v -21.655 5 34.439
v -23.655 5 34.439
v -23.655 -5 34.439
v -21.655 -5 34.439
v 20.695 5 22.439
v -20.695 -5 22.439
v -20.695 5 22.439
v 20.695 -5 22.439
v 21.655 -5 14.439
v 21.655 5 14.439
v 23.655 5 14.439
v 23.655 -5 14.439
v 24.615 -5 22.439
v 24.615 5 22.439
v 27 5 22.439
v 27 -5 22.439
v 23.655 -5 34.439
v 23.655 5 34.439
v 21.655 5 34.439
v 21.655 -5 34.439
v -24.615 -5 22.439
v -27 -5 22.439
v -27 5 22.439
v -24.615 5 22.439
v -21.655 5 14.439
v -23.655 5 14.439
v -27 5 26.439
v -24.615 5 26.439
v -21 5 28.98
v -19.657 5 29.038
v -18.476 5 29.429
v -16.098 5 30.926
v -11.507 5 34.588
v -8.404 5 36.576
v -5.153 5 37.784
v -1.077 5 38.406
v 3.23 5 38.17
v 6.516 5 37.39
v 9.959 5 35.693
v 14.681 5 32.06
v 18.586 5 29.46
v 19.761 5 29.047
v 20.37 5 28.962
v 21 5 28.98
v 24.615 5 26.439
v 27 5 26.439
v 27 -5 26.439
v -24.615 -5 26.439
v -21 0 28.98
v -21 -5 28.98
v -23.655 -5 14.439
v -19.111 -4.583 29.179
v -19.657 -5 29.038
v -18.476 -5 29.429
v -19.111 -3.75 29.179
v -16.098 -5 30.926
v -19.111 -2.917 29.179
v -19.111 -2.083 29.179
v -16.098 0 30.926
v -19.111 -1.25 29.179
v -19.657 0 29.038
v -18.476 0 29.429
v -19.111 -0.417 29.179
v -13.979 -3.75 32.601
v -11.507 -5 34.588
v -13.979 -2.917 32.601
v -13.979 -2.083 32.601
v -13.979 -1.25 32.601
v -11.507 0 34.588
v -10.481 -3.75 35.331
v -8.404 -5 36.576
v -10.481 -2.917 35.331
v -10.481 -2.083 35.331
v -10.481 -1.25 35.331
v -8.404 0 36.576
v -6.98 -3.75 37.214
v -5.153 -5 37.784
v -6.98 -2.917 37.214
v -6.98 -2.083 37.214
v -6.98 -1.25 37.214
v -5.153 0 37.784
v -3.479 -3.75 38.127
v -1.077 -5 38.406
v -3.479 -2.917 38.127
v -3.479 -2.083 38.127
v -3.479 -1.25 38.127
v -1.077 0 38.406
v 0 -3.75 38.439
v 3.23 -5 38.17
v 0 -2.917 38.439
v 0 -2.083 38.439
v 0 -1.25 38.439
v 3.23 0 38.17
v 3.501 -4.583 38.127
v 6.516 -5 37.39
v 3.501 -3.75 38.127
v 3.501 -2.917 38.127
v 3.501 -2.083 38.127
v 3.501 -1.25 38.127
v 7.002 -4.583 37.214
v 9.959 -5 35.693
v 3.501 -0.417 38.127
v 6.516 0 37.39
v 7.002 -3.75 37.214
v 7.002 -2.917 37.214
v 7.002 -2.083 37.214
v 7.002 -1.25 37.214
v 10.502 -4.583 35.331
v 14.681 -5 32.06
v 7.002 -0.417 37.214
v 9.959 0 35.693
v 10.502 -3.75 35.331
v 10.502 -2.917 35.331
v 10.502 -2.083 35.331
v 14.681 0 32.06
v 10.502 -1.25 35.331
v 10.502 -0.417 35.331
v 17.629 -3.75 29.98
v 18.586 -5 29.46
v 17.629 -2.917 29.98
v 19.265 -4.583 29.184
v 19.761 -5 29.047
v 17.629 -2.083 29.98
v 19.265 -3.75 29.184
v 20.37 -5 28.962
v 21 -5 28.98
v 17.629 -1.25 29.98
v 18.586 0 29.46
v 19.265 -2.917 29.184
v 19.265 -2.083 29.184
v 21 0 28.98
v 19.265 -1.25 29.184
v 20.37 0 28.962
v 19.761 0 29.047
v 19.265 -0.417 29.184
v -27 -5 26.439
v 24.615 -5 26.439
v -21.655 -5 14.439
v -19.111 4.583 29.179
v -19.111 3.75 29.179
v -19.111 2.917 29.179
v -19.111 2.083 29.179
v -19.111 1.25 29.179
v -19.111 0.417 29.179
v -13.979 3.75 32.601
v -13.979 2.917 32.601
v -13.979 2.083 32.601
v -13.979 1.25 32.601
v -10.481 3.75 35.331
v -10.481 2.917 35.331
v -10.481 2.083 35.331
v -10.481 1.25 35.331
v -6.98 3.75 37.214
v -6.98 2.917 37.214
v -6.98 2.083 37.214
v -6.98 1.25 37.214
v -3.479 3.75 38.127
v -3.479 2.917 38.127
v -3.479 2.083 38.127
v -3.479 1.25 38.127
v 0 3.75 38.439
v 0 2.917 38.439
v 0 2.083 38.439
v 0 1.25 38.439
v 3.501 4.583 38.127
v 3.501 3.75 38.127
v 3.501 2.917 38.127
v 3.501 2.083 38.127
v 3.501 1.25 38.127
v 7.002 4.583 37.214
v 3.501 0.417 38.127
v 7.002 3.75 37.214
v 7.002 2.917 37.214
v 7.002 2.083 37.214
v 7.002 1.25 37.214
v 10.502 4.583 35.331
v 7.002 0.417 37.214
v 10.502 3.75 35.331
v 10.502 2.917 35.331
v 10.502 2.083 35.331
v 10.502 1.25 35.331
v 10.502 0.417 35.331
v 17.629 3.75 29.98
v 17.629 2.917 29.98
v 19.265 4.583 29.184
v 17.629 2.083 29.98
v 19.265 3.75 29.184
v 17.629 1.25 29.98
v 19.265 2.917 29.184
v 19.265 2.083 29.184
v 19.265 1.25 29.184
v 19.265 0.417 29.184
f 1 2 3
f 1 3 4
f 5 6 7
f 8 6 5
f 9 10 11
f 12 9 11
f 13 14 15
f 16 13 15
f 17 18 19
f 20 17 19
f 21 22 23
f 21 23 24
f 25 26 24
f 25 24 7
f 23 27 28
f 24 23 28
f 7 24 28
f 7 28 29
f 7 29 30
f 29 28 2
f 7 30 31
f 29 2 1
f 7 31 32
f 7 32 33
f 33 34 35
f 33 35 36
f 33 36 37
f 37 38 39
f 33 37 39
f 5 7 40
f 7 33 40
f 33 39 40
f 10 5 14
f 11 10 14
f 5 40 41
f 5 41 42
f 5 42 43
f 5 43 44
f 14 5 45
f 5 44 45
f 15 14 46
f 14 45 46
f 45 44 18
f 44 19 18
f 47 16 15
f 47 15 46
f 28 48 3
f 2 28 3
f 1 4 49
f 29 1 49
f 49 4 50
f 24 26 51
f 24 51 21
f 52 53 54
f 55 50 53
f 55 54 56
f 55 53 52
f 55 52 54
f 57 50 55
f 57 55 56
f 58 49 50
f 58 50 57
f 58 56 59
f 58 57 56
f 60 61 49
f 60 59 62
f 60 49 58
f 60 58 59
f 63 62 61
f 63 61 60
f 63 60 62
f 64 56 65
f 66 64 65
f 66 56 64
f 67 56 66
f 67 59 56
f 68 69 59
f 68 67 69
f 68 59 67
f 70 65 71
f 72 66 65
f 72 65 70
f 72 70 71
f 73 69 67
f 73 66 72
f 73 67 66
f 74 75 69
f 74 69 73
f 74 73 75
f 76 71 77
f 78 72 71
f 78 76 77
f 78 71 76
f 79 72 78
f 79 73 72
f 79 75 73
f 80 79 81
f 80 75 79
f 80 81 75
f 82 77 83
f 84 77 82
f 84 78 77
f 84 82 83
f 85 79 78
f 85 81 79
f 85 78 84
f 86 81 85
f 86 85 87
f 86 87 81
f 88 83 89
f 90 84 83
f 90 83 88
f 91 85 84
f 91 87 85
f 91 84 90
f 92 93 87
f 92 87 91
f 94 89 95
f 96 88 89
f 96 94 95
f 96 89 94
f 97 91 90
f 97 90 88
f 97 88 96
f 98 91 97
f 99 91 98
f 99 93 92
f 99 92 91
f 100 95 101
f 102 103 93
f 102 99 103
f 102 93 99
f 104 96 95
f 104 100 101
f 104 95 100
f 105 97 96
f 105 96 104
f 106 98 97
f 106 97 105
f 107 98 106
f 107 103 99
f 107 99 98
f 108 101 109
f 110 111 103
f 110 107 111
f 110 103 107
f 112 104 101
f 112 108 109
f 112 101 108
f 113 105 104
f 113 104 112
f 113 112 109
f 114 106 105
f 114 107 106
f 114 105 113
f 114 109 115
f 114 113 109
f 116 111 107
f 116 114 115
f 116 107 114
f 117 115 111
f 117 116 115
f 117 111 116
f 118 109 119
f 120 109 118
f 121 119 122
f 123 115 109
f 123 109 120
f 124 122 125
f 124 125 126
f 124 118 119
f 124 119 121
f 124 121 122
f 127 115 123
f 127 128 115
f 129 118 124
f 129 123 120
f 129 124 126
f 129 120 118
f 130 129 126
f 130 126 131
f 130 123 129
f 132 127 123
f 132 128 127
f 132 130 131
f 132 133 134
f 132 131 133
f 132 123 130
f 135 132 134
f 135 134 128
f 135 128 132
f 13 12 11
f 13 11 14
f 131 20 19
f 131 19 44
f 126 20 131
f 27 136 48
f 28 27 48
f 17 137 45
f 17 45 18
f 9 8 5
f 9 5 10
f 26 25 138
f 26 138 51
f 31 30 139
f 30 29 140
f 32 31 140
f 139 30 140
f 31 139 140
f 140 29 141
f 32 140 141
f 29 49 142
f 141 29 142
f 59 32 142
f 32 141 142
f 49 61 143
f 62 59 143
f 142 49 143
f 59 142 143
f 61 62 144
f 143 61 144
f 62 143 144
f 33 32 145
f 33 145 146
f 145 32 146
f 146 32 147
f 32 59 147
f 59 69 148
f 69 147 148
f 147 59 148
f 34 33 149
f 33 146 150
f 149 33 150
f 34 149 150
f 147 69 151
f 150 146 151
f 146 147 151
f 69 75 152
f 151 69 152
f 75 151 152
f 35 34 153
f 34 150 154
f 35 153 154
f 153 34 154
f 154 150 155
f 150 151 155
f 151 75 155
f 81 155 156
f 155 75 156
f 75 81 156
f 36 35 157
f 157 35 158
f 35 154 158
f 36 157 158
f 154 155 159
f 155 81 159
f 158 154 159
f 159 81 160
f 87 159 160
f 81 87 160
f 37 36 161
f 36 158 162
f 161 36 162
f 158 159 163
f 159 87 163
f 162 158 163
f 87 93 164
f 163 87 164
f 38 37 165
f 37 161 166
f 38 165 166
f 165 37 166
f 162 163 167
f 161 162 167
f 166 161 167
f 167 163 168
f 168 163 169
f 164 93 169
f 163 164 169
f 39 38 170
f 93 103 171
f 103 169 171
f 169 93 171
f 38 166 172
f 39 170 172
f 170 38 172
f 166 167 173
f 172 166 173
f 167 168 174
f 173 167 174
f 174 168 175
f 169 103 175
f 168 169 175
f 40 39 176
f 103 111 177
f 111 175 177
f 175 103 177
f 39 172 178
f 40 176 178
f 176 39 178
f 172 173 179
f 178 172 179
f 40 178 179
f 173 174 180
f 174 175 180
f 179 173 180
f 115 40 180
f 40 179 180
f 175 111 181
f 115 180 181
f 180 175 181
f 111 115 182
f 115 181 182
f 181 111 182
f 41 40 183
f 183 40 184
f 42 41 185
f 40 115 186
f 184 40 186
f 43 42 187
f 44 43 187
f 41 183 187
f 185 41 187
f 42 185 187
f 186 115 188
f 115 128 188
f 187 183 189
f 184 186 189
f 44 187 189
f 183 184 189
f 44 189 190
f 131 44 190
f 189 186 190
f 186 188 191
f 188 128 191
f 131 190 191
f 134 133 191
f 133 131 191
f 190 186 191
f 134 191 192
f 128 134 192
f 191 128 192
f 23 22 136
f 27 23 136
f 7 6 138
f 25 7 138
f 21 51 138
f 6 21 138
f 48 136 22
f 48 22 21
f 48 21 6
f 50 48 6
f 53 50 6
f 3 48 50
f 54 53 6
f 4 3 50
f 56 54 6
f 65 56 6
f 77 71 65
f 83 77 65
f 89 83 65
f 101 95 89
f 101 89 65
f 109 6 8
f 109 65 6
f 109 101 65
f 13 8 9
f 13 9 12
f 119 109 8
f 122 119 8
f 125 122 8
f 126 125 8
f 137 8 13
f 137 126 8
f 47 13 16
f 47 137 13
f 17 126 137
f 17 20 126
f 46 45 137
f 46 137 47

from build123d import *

# Parameters (mm, degrees)
F1_W     = 54
F1_H     = 4
F2_DEPTH = 5
F4_DEPTH = 5
F6_DEPTH = 5


with BuildPart() as f2:
    # F1 (on Front) → F2 (new body, symmetric)
    with BuildSketch(Plane.XZ):
        with Locations((0, 24.4391597784)):
            Rectangle(F1_W, F1_H)
    extrude(amount=F2_DEPTH, both=True)

    # F5: F4 across plane


with BuildPart() as f4:
    # F3 (on Front) → F4 (new body, symmetric)
    with BuildSketch(Plane.XZ):
        Polygon((21.6551174292, 34.4391597784), (20.4551174292, 24.4391597784), (21.6551174292, 14.4391597784), (23.6551174292, 14.4391597784), (24.8551174292, 24.4391597784), (23.6551174292, 34.4391597784), align=None)
    extrude(amount=F4_DEPTH, both=True)


with BuildPart() as f2_1:
    add(f2.part)
    add(f4.part.mirror(Plane.YZ))


    add(f4.part)  # F6 merges F4
    # F0 (on Front) → F6 (join, symmetric)
    with BuildSketch(Plane.XZ):
        with BuildLine():
            Line((-21, 26.4391597784), (21, 26.4391597784))
            Line((21, 26.4391597784), (21, 28.9798478681))
            add(Edge.make_bspline(
                [(-21, 28.9798478681), (-19.5953512364, 28.8401652252), (-17.391429418, 29.8376339387), (-13.9476569454, 32.6070199787), (-10.5904127723, 35.42087783), (-7.0658407923, 37.3677794905), (-3.5015046033, 38.199162892), (-0.0004836835, 38.5579308119), (3.5247350414, 38.2002323502), (7.084375424, 37.3668707381), (10.6175923145, 35.4245267912), (13.9608785638, 32.5811894464), (17.4960225284, 29.8837543114), (19.7866070593, 28.8401652252), (21, 28.9798478681)],
                knots=[0, 0, 0, 0, 0.0806013739, 0.1686553866, 0.2573747863, 0.3413343067, 0.4214474157, 0.5001651337, 0.5791215884, 0.6592349037, 0.7431945127, 0.831913137, 0.921023509, 1, 1, 1, 1], degree=3))
            Line((-21, 28.9798478681), (-21, 26.4391597784))
        make_face()
    extrude(amount=F6_DEPTH, both=True)


solid = f2_1.part
